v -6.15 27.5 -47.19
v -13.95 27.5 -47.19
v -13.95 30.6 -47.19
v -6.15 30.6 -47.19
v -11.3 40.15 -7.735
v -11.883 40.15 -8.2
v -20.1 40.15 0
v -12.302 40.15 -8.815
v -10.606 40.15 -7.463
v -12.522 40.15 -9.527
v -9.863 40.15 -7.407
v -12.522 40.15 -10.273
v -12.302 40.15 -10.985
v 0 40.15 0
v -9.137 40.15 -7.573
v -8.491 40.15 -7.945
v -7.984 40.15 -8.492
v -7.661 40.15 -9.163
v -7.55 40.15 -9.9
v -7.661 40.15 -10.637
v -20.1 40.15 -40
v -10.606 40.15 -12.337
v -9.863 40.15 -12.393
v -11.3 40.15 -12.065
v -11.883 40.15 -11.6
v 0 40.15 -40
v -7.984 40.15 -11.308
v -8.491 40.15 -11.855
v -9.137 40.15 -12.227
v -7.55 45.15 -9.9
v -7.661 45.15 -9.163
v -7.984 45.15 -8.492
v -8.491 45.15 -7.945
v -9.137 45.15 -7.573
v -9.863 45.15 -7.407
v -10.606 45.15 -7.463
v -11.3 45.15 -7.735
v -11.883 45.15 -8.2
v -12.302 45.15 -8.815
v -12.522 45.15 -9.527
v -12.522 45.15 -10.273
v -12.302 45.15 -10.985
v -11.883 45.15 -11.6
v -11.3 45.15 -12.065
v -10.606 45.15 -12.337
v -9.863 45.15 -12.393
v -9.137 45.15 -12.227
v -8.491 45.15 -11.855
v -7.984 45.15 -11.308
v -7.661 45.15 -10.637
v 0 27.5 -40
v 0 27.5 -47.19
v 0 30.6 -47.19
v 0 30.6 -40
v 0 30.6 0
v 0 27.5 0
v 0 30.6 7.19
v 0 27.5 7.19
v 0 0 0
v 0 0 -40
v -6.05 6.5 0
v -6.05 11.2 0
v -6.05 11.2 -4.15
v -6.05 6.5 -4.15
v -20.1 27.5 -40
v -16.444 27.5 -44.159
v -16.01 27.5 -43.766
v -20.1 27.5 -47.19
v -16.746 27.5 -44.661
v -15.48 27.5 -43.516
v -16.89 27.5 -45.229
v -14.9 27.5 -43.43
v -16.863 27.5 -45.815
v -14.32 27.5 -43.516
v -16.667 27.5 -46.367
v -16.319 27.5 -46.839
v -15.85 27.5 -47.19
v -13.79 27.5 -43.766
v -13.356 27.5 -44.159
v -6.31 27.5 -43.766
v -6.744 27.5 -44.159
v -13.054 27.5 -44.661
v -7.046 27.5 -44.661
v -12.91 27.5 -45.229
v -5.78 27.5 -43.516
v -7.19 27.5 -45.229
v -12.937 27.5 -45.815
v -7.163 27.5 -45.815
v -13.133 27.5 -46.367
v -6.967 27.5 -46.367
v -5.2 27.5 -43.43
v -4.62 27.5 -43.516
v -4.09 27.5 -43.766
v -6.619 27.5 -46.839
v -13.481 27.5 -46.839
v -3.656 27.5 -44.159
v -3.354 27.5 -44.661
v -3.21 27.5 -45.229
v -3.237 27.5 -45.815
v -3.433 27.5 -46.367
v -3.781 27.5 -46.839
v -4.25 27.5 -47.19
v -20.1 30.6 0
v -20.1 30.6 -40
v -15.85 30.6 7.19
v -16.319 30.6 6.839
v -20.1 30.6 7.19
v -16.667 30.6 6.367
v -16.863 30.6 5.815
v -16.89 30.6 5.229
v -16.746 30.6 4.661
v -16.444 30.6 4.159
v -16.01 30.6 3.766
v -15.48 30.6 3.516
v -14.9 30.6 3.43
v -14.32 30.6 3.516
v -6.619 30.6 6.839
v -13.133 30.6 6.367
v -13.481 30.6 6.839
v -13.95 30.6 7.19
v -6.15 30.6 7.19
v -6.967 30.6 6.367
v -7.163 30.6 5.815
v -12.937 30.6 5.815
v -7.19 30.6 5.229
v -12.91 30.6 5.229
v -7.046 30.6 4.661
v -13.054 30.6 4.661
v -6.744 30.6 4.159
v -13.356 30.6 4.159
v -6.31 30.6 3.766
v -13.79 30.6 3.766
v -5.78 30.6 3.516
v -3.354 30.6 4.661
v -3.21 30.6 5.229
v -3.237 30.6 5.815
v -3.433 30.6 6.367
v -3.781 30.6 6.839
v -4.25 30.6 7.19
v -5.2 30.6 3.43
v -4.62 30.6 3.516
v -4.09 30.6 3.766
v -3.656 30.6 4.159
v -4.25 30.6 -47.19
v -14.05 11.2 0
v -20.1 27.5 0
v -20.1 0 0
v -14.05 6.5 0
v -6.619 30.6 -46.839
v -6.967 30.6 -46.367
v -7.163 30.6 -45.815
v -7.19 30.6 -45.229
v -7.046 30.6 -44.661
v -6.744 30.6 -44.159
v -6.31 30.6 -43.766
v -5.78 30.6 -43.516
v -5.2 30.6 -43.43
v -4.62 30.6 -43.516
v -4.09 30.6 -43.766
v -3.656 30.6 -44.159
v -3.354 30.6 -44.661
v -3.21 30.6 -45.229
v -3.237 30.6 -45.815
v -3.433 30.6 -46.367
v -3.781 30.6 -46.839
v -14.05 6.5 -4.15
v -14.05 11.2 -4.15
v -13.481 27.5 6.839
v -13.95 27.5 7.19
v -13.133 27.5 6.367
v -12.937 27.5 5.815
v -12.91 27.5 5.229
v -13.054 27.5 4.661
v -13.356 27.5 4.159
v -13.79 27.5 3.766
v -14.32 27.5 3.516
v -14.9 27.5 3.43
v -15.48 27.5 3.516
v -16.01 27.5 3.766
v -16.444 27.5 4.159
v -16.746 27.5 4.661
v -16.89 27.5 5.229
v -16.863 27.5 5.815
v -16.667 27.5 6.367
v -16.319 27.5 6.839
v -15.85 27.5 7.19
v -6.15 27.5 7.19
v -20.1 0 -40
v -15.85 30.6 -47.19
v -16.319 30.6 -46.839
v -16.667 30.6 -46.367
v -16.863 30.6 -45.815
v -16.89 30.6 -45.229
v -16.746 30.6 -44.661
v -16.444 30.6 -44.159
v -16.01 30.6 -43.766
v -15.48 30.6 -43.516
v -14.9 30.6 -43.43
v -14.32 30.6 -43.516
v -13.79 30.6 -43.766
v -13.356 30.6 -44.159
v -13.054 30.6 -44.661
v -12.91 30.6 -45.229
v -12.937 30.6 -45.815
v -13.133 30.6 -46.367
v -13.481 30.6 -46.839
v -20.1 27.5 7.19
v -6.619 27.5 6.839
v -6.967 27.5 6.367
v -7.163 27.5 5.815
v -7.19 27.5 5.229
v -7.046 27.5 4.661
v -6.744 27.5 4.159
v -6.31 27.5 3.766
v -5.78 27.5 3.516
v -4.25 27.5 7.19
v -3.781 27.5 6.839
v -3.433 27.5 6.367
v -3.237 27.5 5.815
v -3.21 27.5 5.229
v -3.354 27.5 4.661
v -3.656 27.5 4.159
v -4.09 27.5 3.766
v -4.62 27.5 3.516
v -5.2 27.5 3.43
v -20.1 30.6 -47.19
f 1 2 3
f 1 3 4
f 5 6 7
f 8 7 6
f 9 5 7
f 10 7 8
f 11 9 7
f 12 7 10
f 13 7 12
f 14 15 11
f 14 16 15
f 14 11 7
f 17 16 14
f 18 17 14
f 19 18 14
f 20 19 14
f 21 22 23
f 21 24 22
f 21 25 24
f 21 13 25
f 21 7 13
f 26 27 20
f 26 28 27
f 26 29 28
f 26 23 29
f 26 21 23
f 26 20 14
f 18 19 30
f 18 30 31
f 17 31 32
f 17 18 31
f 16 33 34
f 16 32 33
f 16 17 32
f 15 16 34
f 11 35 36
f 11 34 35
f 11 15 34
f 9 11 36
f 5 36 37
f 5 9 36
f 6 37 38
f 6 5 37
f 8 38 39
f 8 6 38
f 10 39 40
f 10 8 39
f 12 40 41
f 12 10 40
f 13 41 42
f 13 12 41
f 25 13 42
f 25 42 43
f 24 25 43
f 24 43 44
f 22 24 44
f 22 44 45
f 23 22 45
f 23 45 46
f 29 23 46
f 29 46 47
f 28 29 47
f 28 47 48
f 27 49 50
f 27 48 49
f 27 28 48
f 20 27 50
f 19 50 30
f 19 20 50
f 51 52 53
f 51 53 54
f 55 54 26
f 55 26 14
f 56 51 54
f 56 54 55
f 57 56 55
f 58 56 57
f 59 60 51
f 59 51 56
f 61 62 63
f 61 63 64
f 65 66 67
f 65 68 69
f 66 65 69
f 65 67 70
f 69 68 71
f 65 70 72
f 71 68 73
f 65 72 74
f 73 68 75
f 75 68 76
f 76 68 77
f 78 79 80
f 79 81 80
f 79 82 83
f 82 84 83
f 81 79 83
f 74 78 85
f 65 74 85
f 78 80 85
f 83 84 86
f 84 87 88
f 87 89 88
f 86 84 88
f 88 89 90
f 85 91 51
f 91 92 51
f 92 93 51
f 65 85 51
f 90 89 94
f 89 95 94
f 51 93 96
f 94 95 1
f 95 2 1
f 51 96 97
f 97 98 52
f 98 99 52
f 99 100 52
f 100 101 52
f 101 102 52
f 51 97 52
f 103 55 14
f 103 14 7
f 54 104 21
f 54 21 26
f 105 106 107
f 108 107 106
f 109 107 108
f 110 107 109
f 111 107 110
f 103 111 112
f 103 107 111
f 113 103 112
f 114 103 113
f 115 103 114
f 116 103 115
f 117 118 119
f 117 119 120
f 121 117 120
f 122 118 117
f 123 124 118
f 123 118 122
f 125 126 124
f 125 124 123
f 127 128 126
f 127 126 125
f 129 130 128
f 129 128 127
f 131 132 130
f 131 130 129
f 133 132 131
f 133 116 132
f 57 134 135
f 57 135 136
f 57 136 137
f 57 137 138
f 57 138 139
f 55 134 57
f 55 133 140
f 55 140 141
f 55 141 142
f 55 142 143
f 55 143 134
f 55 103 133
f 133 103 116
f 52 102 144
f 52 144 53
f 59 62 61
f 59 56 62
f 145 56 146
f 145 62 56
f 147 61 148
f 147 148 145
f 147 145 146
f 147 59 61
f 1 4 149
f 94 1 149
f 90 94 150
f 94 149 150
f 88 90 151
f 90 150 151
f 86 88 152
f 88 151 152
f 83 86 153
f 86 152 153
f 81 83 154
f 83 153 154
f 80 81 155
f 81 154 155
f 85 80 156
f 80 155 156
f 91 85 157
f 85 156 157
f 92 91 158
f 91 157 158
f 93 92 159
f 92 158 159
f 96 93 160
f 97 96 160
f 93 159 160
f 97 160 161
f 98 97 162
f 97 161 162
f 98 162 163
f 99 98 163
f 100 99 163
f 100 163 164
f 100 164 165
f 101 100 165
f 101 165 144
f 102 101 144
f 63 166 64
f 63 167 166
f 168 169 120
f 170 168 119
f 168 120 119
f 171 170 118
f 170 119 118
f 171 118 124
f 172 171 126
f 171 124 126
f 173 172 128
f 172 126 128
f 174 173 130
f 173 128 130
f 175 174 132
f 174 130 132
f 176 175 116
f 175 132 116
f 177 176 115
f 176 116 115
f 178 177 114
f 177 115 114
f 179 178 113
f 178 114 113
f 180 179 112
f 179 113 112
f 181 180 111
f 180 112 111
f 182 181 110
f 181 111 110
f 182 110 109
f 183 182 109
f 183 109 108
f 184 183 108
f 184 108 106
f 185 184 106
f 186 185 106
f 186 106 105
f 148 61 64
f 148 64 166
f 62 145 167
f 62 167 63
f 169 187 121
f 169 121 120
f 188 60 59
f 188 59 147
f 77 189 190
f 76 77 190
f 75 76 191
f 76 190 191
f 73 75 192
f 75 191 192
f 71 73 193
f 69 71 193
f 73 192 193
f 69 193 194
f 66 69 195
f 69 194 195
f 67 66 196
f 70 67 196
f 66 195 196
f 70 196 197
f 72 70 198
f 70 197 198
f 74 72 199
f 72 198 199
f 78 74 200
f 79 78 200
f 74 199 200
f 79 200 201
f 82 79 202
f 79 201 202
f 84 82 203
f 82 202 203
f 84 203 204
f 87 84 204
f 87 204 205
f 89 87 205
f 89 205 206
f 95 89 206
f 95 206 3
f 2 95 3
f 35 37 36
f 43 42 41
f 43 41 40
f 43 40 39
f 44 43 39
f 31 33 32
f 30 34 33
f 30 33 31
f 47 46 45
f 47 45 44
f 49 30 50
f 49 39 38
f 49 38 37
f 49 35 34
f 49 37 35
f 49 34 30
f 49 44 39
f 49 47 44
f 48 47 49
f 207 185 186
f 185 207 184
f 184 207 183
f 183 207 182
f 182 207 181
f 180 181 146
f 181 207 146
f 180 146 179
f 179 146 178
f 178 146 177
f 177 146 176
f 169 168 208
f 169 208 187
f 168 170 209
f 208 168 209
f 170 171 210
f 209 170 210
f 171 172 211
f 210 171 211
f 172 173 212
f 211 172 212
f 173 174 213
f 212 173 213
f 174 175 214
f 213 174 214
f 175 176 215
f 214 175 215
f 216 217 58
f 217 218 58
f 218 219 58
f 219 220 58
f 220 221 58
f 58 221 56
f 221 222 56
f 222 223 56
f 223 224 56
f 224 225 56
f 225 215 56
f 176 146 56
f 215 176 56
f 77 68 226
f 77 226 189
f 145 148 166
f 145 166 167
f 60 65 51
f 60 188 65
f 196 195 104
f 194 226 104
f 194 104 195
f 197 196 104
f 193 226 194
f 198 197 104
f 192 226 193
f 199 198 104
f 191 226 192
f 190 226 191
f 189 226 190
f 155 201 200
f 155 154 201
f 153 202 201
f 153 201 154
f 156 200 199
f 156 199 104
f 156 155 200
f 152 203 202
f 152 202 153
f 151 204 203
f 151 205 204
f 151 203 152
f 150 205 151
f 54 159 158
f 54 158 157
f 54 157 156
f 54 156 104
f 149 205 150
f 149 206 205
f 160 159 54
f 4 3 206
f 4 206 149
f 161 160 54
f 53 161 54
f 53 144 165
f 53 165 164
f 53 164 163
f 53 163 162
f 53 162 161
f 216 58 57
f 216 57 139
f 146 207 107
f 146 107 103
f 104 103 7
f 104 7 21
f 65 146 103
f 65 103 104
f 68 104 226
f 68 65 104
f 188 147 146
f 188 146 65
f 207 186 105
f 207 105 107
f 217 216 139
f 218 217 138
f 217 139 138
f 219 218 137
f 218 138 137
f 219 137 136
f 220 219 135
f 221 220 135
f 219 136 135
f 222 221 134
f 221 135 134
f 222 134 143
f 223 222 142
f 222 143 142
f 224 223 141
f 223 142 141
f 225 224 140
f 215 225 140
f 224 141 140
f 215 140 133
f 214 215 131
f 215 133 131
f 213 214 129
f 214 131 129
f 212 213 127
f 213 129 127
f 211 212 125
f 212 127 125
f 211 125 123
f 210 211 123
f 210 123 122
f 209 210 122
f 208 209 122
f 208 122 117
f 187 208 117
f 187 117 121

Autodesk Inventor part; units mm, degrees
ref_plane "YZ Plane" through (0, 0, 0) normal (1, 0, 0) x (0, 1, 0)
ref_plane "XZ Plane" through (0, 0, 0) normal (0, 1, 0) x (-1, 0, 0)
ref_plane "XY Plane" through (0, 0, 0) normal (0, 0, 1) x (1, 0, 0)
sketch "スケッチ2" plane through (0, 0, 0) normal (0, 1, 0) x (-1, 0, 0)
  line L0 (0, 0) -> (20.1, 0)
  line L1 (20.1, 0) -> (20.1, -40)
  line L2 (20.1, -40) -> (0, -40)
  line L3 (0, -40) -> (0, 0)
  dimension "d0" = 20.1
  dimension "d1" = 40
extrude "押し出し1" add sketch "スケッチ2" along normal blind 27.5
ref_plane "作業平面1" through (0, 27.5, 0) normal (0, 1, 0) x (1, 0, 0)
sketch "スケッチ3" plane through (0, 27.5, 0) normal (0, 1, 0) x (1, 0, 0)
  line L0 (-20.1, 47.19) -> (0, 47.19)
  line L1 (0, 47.19) -> (0, -7.19)
  line L2 (0, -7.19) -> (-20.1, -7.19)
  line L3 (-20.1, -7.19) -> (-20.1, 47.19)
  line L4 (-20.1, 40) -> (-20.1, 0) projected
  line L5 (0, 40) -> (-20.1, 40) projected
  point P0 (0, 0)
  point P1 (-20.1, 20)
  point P2 (-20.1, 20)
  point P3 (-10.05, 47.19)
  point P4 (-10.05, 40)
  point P5 (-10.05, 40)
  point P6 (0, 40)
  point P7 (-20.1, 40)
  dimension "d5" = 20.1
  dimension "d6" = 54.38
  dimension "d7" = 0
  dimension "d8" = 0
extrude "押し出し2" add sketch "スケッチ3" along normal blind 3.1
ref_plane "作業平面2" through (0, 30.6, 0) normal (0, 1, 0) x (1, 0, 0)
sketch "スケッチ4" plane through (0, 30.6, 0) normal (0, 1, 0) x (1, 0, 0)
  line L0 (0, -7.19) -> (0, 0) projected
  line L1 (0, 0) -> (-20.1, 0)
  line L2 (-20.1, 0) -> (-20.1, 40)
  line L3 (-20.1, 40) -> (0, 40)
  line L4 (0, 40) -> (0, 0)
  circle A0 centre (-14.9, 45.43) radius 2
  circle A1 centre (-5.2, 45.43) radius 2
  line L5 (-15.85, 47.19) -> (-13.95, 47.19)
  line L6 (-6.15, 47.19) -> (-4.25, 47.19)
  line L7 (-13.95, 47.19) -> (-6.15, 47.19)
  line L8 (0, 47.19) -> (-20.1, 47.19) projected
  point P0 (-10.05, 47.19)
  dimension "d12" = 40
  dimension "d23" = 4
  dimension "d24" = 4
  dimension "d27" = 1.9
  dimension "d28" = 1.9
  dimension "d29" = 7.8
  dimension "d53" = 20.1
extrude "押し出し3" add sketch "スケッチ4" along normal blind 9.55 contours L1 L2 L3 L4
sketch "スケッチ7" plane through (0, 30.6, 0) normal (0, 1, 0) x (1, 0, 0)
  circle A0 centre (-14.9, 45.43) radius 2
  circle A1 centre (-5.2, 45.43) radius 2
  circle A2 centre (-14.9, -5.43) radius 2
  circle A3 centre (-5.2, -5.43) radius 2
  line L0 (-13.95, 47.19) -> (-15.85, 47.19)
  line L1 (-6.15, 47.19) -> (-4.25, 47.19)
  line L2 (-15.85, -7.19) -> (-13.95, -7.19)
  line L3 (-6.15, -7.19) -> (-4.25, -7.19)
  line L4 (-13.95, -7.19) -> (-6.15, -7.19)
  line L5 (-13.95, 47.19) -> (-6.15, 47.19)
  line L6 (0, 47.19) -> (-20.1, 47.19) projected
  line L7 (-20.1, -7.19) -> (0, -7.19) projected
  point P0 (0, 0)
  point P1 (-10.05, -7.19)
  point P2 (-10.05, 47.19)
  point P3 (-10.05, -7.19)
  dimension "d33" = 4
  dimension "d34" = 4
  dimension "d35" = 4
  dimension "d36" = 4
  dimension "d37" = 1.9
  dimension "d38" = 1.9
  dimension "d39" = 1.9
  dimension "d40" = 1.9
  dimension "d41" = 7.8
  dimension "d42" = 7.8
extrude "押し出し6" cut sketch "スケッチ7" against normal through all contours A0 L0 | L1 A1 | A2 L2 | A3 L3 | L3 A3 | L2 A2 picked at (-15.3262, 45.9006) picked at (-5.6145, 46.6348)
ref_plane "作業平面5" through (-20.1, 0, 0) normal (0, 0, 1) x (1, 0, 0)
sketch "スケッチ8" plane through (-20.1, 0, 0) normal (0, 0, 1) x (1, 0, 0)
  line L0 (6.05, 11.2) -> (14.05, 11.2)
  line L1 (14.05, 11.2) -> (14.05, 6.5)
  line L2 (14.05, 6.5) -> (6.05, 6.5)
  line L3 (6.05, 6.5) -> (6.05, 11.2)
  line L4 (0, 0) -> (0, 27.5) projected
  line L5 (20.1, 0) -> (20.1, 27.5) projected
  line L6 (0, 0) -> (20.1, 0) projected
  dimension "d46" = 8
  dimension "d47" = 4.7
  dimension "d48" = 6.05
  dimension "d49" = 6.05
  dimension "d50" = 6.5
extrude "押し出し7" cut sketch "スケッチ8" against normal blind 4.15
ref_plane "作業平面6" through (0, 40.15, 0) normal (0, 1, 0) x (1, 0, 0)
sketch "スケッチ10" plane through (0, 40.15, 0) normal (0, 1, 0) x (1, 0, 0)
  line L0 (-20.1, 0) -> (0, 0) projected
  circle A0 centre (-10.05, 9.9) radius 2.5
  point P0 (-10.05, 0)
  dimension "d57" = 9.9
  dimension "d59" = 5
extrude "押し出し8" add sketch "スケッチ10" along normal blind 5
ref_plane "作業平面7" through (-10.05, 45.15, -9.9) normal (0, 1, 0) x (1, 0, 0)
sketch "スケッチ11" plane through (-10.05, 45.15, -9.9) normal (0, 1, 0) x (1, 0, 0)
  line L0 (-10.05, -9.9) -> (10.05, -9.9) projected
  point P0 (0, 0)
  point P1 (0, -9.9)
  dimension "d63" = 9.9
